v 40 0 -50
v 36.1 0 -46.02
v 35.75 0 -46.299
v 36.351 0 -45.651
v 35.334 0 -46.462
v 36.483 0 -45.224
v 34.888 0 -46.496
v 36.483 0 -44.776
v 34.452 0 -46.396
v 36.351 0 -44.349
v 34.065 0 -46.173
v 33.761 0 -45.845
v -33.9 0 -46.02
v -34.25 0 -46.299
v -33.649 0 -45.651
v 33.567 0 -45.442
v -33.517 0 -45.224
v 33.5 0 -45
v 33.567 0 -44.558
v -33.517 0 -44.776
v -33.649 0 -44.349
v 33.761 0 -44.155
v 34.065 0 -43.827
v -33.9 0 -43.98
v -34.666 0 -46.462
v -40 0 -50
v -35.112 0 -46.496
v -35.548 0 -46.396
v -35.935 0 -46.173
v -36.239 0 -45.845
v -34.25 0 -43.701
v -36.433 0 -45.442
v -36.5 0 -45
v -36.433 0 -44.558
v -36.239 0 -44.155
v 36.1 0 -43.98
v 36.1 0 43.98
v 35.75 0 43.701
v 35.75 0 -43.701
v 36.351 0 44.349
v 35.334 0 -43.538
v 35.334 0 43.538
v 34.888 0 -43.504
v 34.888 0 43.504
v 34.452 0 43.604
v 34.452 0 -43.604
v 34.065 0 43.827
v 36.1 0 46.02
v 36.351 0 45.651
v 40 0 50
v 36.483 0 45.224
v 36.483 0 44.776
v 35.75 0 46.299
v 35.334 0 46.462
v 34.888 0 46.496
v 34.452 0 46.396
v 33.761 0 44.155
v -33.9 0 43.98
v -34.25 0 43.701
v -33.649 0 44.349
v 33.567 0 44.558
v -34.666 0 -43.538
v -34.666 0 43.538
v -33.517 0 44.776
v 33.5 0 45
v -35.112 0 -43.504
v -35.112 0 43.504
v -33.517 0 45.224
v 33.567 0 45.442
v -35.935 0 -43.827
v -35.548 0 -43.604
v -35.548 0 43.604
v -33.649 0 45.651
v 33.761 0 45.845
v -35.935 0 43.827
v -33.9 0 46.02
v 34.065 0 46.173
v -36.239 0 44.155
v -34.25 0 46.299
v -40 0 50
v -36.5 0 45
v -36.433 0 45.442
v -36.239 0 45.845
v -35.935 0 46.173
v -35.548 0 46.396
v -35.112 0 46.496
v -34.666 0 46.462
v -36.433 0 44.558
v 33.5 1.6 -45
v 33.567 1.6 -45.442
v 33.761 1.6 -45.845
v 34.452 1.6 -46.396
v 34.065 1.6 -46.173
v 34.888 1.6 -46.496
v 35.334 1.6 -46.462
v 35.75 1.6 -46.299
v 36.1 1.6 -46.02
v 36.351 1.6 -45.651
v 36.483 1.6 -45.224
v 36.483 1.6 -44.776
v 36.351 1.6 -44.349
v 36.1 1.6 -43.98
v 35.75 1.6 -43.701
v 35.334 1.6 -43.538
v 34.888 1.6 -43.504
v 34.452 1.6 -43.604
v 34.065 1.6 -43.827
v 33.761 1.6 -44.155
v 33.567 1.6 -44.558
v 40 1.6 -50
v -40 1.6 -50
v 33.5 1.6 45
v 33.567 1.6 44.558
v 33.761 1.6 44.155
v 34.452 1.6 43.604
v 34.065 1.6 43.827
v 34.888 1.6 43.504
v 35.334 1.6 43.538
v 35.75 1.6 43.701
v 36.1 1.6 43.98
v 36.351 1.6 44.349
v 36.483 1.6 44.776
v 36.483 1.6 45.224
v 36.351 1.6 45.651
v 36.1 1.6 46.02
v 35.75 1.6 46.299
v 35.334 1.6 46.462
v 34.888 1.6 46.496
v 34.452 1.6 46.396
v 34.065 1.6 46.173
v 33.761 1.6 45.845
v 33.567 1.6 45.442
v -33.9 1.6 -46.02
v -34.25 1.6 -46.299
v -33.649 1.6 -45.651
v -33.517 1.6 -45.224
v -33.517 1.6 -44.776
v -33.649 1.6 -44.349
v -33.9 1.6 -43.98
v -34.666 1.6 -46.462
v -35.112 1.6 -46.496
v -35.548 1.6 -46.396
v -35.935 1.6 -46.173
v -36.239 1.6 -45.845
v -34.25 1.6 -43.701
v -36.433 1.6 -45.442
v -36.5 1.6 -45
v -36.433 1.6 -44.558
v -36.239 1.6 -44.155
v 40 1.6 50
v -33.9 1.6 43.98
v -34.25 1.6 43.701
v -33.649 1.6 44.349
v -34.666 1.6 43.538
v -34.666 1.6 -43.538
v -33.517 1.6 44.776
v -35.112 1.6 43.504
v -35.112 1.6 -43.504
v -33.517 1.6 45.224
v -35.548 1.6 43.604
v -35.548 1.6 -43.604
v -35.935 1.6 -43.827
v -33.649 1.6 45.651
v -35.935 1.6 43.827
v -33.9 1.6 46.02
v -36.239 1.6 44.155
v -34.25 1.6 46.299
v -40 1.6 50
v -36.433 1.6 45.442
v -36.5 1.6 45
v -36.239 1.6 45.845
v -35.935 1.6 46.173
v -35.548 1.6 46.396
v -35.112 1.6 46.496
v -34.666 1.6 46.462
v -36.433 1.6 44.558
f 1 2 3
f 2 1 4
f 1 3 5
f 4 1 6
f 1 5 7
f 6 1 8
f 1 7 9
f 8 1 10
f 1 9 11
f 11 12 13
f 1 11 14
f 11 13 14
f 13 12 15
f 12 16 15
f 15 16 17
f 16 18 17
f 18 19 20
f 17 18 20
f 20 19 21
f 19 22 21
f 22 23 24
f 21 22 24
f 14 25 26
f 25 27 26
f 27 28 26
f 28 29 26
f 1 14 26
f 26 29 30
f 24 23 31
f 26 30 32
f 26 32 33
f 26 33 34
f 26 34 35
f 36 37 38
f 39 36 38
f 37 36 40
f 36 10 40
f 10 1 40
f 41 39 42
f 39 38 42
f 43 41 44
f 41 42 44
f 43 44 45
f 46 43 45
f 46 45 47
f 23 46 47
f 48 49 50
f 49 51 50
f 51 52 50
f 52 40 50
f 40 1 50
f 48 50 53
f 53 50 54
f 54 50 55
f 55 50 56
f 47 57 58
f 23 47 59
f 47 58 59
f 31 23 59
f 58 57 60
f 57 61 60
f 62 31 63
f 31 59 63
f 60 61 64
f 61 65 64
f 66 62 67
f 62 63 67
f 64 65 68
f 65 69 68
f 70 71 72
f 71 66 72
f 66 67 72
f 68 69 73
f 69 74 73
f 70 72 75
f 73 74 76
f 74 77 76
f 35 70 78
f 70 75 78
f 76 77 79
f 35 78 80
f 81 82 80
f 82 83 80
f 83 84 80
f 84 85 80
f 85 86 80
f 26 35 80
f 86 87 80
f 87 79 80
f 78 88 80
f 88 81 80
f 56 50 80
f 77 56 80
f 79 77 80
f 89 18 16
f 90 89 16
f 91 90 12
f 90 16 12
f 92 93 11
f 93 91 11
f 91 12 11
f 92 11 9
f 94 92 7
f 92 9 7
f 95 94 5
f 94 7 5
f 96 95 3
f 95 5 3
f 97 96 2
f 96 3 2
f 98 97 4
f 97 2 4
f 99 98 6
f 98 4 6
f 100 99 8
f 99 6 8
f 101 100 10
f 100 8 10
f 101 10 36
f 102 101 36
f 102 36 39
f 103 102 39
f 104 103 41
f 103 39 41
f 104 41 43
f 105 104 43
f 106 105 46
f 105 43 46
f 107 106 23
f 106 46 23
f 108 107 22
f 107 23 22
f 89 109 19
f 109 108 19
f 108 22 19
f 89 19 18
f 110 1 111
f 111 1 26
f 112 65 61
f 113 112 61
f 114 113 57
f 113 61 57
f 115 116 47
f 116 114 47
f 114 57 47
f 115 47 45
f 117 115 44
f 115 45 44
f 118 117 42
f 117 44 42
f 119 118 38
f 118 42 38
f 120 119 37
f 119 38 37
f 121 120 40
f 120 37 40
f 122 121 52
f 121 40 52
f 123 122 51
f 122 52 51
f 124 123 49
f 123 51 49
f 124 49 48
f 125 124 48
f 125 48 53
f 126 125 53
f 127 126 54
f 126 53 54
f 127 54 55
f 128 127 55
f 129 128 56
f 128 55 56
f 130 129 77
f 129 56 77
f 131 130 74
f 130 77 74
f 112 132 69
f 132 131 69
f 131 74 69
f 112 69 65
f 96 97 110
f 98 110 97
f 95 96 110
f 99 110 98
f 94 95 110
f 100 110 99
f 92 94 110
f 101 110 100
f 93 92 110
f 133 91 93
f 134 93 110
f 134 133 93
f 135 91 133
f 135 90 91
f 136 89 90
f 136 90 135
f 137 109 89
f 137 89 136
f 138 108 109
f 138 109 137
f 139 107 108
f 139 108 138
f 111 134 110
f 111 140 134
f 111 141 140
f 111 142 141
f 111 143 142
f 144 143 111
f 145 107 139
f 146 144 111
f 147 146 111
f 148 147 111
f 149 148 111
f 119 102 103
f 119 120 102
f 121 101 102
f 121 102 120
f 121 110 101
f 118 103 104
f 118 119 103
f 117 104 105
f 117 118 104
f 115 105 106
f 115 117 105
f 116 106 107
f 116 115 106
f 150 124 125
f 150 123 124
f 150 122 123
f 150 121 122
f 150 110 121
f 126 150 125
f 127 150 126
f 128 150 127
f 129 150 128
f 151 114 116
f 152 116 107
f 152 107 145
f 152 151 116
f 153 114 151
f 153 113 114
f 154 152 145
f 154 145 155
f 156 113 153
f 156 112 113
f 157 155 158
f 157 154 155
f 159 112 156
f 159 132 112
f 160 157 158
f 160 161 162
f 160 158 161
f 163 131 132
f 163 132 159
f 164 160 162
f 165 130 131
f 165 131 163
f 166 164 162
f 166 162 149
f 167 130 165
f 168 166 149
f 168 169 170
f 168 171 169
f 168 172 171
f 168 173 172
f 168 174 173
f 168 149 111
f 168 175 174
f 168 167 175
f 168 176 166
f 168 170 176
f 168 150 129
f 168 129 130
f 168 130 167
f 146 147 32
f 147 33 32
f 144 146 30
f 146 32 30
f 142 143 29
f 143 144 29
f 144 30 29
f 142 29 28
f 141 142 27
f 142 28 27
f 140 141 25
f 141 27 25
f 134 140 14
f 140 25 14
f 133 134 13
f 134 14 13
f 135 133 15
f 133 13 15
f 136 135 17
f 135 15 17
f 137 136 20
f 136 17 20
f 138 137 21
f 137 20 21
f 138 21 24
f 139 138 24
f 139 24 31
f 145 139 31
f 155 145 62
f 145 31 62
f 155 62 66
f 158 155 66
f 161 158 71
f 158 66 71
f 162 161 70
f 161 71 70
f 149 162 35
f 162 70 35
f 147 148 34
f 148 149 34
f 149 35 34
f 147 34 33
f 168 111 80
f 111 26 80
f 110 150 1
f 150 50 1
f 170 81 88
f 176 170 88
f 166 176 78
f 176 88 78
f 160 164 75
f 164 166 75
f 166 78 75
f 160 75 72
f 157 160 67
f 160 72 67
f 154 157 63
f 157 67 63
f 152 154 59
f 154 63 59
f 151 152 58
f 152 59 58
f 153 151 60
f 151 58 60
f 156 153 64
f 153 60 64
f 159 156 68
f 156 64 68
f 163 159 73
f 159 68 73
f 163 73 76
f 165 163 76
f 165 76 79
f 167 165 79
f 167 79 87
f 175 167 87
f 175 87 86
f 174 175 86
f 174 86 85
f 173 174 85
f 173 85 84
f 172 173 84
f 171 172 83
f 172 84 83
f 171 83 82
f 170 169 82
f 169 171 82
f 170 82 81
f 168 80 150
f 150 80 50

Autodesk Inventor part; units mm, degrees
ref_plane "YZ Plane" through (0, 0, 0) normal (1, 0, 0) x (0, 1, 0)
ref_plane "XZ Plane" through (0, 0, 0) normal (0, 1, 0) x (-1, 0, 0)
ref_plane "XY Plane" through (0, 0, 0) normal (0, 0, 1) x (1, 0, 0)
sketch "Skizze1" plane through (0, 0, 0) normal (0, 1, 0) x (-1, 0, 0)
  line L0 (40, 50) -> (-40, 50)
  line L1 (-40, 50) -> (-40, -50)
  line L2 (-40, -50) -> (40, -50)
  line L3 (40, -50) -> (40, 50)
  line L4 (0, 0) -> (0, -50) construction
  line L5 (0, 0) -> (40, 0) construction
  line L6 (35, 45) -> (-35, 45) construction
  line L7 (-35, 45) -> (-35, -45) construction
  line L8 (-35, -45) -> (35, -45) construction
  line L9 (35, -45) -> (35, 45) construction
  circle A0 centre (35, 45) radius 1.5
  circle A1 centre (-35, 45) radius 1.5
  circle A2 centre (-35, -45) radius 1.5
  circle A3 centre (35, -45) radius 1.5
  point P0 (35, 0)
  point P1 (0, -45)
  dimension "d0" = 100
  dimension "d1" = 80
  dimension "d2" = 5
  dimension "d3" = 5
  dimension "d4" = 3
  dimension "d5" = 3
  dimension "d6" = 3
  dimension "d7" = 3
extrude "Extrusion1" add sketch "Skizze1" along normal blind 1.6
properties part number "Platine_MCU"
